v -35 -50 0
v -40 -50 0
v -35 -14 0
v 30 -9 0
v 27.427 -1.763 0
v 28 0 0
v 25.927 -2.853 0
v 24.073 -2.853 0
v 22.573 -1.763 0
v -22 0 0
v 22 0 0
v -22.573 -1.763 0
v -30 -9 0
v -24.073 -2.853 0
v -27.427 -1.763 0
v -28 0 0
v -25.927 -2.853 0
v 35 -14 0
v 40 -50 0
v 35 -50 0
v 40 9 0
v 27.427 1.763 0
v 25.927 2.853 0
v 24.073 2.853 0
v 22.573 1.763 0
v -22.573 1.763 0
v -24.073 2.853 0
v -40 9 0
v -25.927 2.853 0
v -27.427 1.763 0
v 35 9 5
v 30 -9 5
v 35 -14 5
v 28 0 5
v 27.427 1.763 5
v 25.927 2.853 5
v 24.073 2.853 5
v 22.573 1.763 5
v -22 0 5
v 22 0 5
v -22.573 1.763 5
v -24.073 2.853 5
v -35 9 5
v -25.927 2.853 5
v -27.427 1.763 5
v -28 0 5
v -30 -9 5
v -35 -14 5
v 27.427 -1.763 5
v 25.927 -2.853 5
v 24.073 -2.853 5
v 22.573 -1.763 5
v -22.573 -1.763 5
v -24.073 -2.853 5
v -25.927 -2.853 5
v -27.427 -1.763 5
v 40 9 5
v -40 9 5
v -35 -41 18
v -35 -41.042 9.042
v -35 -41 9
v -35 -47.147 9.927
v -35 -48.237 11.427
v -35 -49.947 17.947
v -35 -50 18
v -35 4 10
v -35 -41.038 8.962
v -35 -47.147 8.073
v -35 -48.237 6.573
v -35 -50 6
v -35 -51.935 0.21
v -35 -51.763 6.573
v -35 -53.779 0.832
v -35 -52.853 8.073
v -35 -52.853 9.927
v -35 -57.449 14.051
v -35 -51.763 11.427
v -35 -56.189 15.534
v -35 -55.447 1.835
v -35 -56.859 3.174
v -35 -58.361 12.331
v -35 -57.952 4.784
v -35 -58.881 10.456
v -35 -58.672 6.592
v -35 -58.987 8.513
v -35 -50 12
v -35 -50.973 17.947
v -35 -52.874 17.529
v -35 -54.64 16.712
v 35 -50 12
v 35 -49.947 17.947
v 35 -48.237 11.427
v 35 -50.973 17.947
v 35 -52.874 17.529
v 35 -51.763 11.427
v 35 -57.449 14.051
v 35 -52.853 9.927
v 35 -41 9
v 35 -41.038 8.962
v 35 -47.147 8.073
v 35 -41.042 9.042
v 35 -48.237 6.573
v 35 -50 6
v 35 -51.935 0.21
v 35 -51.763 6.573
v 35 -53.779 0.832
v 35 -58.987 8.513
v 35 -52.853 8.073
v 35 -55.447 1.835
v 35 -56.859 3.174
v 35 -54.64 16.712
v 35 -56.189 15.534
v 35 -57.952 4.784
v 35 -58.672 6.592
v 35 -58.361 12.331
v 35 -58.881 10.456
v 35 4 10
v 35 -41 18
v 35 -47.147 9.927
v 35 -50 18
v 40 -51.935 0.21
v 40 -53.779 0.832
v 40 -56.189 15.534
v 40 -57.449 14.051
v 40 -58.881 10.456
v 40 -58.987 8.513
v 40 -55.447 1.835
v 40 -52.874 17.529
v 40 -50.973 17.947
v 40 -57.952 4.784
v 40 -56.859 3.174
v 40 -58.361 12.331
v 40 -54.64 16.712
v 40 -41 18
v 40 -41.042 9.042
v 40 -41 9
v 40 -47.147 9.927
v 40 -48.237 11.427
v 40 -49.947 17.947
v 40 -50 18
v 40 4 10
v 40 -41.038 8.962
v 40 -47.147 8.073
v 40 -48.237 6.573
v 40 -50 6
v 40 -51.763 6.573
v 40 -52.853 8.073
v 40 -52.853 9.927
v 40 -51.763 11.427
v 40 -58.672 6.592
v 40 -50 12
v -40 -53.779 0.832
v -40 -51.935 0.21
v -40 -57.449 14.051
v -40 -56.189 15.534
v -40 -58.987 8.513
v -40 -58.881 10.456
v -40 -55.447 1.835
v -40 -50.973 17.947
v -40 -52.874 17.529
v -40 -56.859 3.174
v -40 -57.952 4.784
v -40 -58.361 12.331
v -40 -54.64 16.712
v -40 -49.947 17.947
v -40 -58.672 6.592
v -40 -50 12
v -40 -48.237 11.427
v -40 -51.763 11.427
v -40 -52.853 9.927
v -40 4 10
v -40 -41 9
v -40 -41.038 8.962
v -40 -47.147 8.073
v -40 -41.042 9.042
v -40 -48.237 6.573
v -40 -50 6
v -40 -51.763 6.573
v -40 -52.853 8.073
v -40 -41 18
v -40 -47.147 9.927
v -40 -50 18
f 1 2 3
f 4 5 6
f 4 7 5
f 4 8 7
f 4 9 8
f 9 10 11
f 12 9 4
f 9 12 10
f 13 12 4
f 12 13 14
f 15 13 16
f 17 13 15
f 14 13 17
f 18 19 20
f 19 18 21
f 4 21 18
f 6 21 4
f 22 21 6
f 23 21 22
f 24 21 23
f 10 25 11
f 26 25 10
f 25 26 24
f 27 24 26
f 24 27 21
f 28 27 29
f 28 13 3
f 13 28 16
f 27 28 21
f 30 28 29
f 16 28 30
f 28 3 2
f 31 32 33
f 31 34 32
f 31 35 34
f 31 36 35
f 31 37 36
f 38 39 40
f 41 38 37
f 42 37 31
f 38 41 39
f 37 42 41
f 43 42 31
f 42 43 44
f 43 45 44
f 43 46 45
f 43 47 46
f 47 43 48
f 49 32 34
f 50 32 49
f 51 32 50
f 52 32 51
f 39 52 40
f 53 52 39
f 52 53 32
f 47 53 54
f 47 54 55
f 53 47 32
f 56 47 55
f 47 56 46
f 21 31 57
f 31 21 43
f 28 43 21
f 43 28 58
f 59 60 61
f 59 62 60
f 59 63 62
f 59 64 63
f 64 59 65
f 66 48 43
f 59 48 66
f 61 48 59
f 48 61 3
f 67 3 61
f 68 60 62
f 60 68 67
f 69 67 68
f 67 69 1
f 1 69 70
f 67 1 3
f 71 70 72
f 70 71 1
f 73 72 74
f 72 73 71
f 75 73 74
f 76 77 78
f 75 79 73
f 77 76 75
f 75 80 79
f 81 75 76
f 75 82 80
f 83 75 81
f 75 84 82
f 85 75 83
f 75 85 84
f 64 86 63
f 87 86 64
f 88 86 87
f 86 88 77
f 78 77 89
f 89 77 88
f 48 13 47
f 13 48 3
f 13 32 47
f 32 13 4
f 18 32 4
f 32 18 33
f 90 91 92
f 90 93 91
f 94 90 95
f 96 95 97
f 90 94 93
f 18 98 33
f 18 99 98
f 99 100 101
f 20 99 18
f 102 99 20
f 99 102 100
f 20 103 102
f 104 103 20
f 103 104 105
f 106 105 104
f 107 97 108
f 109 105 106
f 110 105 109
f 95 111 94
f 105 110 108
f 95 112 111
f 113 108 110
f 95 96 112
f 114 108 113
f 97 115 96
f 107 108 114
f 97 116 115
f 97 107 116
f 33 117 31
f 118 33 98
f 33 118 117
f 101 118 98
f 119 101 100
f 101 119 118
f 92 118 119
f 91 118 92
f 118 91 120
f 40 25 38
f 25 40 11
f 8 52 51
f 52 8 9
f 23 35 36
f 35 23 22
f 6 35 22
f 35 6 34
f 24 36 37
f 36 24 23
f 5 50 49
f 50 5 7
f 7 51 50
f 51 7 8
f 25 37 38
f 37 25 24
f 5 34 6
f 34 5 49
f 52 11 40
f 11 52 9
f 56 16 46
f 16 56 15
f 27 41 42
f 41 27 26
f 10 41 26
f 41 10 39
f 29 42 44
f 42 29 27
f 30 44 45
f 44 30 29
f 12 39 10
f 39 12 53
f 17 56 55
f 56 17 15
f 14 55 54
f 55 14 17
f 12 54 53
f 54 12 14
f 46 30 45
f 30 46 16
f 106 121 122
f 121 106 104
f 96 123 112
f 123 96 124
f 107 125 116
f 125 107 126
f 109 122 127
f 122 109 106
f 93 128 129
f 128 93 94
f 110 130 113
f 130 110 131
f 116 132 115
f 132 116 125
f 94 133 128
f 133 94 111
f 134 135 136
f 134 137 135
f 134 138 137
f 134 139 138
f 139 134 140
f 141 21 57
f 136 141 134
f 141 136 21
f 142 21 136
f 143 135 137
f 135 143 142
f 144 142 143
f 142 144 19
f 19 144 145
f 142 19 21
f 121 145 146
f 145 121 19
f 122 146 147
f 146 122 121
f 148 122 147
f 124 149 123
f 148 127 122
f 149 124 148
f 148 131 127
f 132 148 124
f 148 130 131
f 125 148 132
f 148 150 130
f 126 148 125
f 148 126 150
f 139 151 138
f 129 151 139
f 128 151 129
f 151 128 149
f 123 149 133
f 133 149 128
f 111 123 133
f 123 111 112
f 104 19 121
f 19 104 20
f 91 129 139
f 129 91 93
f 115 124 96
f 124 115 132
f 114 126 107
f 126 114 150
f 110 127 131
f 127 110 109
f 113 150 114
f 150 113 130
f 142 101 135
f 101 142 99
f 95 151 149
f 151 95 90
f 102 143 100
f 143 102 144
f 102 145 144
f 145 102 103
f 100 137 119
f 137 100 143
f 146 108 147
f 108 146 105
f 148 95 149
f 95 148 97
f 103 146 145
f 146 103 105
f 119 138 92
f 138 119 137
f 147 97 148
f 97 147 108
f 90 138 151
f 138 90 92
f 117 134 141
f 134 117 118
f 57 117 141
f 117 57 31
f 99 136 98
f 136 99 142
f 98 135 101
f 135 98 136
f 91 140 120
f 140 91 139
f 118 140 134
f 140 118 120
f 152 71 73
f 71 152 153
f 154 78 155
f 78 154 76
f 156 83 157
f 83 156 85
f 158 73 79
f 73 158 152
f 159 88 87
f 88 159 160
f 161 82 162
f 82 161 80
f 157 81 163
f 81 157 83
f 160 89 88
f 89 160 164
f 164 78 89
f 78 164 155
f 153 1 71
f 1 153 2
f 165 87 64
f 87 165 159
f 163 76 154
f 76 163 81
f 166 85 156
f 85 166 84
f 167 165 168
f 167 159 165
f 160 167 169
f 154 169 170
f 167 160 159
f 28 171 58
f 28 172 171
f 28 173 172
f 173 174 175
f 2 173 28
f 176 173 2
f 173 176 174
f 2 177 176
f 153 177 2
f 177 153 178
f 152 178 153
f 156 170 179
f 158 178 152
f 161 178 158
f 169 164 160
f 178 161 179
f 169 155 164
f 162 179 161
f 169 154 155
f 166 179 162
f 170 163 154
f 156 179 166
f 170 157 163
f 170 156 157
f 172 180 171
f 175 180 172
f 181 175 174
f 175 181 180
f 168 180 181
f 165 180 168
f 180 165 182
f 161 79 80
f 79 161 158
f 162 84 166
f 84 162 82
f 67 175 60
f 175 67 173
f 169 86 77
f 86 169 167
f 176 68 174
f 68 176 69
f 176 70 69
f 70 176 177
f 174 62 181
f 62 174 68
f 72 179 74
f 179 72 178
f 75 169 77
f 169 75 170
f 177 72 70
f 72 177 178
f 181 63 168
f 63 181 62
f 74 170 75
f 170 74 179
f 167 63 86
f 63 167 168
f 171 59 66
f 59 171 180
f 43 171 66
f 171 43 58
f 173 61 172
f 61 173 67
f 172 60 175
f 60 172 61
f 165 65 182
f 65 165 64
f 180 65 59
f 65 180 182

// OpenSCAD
// Rack Boss Outside Width
design_width = 70; // [62:100]
// Height of light (center-to-center on bolts)
design_height = 50; // [20:75]
// Part Thickness
thickness = 5; //[4,5,6]

/* [Hidden] */

holes = 6;
base_width = 18;
height = design_height + base_width/2;
width = design_width;

//define base

module base () {
    union()
        difference(){
            //cube(size=[width, base_width, thickness], center=true);
            linear_extrude(thickness)
                polygon(points=[
                    [width/2, base_width/2],
                    [width/2, -base_width/2-thickness],
                    [width/2-thickness, -base_width/2],
                    [-width/2+thickness, -base_width/2],
                    [-width/2, -base_width/2-thickness],
                    [-width/2, base_width/2],
                    [width/2, base_width/2]
                    
            ]);
            translate([25,0,0])
                cylinder(thickness*4, d=holes, center=true);
            translate([-25,0,0])
                cylinder(thickness*4, d=holes, center=true);
        }

}

//design flange
module flange () {
    union() {
        translate([thickness/2, height/2,0])
            rotate([0,-90,0])
                union() {
                    linear_extrude(thickness)
                        polygon(points=[
                            [0, 0],
                            [0, -height],
                            [base_width/2, -height+base_width/2],
                            [base_width, -height],
                            [base_width, -height+base_width/2],
                            [thickness*2, -thickness],
                            [thickness, 0],
                            [0, 0] 
                        ]);
                }
        translate([0,-height/2,base_width/2]) 
            rotate([0,90,0])
                difference() {
                    cylinder(thickness, d=base_width, center=true);
                    cylinder(thickness*2, d=holes, center=true);
                }
    }
}

//build
t = thickness;
union() {
    base();
    translate([(width + t)/2, -(height - base_width)/2, 0]) flange();
    translate([(width + t)/-2, -(height - base_width)/2, 0]) flange();
}
